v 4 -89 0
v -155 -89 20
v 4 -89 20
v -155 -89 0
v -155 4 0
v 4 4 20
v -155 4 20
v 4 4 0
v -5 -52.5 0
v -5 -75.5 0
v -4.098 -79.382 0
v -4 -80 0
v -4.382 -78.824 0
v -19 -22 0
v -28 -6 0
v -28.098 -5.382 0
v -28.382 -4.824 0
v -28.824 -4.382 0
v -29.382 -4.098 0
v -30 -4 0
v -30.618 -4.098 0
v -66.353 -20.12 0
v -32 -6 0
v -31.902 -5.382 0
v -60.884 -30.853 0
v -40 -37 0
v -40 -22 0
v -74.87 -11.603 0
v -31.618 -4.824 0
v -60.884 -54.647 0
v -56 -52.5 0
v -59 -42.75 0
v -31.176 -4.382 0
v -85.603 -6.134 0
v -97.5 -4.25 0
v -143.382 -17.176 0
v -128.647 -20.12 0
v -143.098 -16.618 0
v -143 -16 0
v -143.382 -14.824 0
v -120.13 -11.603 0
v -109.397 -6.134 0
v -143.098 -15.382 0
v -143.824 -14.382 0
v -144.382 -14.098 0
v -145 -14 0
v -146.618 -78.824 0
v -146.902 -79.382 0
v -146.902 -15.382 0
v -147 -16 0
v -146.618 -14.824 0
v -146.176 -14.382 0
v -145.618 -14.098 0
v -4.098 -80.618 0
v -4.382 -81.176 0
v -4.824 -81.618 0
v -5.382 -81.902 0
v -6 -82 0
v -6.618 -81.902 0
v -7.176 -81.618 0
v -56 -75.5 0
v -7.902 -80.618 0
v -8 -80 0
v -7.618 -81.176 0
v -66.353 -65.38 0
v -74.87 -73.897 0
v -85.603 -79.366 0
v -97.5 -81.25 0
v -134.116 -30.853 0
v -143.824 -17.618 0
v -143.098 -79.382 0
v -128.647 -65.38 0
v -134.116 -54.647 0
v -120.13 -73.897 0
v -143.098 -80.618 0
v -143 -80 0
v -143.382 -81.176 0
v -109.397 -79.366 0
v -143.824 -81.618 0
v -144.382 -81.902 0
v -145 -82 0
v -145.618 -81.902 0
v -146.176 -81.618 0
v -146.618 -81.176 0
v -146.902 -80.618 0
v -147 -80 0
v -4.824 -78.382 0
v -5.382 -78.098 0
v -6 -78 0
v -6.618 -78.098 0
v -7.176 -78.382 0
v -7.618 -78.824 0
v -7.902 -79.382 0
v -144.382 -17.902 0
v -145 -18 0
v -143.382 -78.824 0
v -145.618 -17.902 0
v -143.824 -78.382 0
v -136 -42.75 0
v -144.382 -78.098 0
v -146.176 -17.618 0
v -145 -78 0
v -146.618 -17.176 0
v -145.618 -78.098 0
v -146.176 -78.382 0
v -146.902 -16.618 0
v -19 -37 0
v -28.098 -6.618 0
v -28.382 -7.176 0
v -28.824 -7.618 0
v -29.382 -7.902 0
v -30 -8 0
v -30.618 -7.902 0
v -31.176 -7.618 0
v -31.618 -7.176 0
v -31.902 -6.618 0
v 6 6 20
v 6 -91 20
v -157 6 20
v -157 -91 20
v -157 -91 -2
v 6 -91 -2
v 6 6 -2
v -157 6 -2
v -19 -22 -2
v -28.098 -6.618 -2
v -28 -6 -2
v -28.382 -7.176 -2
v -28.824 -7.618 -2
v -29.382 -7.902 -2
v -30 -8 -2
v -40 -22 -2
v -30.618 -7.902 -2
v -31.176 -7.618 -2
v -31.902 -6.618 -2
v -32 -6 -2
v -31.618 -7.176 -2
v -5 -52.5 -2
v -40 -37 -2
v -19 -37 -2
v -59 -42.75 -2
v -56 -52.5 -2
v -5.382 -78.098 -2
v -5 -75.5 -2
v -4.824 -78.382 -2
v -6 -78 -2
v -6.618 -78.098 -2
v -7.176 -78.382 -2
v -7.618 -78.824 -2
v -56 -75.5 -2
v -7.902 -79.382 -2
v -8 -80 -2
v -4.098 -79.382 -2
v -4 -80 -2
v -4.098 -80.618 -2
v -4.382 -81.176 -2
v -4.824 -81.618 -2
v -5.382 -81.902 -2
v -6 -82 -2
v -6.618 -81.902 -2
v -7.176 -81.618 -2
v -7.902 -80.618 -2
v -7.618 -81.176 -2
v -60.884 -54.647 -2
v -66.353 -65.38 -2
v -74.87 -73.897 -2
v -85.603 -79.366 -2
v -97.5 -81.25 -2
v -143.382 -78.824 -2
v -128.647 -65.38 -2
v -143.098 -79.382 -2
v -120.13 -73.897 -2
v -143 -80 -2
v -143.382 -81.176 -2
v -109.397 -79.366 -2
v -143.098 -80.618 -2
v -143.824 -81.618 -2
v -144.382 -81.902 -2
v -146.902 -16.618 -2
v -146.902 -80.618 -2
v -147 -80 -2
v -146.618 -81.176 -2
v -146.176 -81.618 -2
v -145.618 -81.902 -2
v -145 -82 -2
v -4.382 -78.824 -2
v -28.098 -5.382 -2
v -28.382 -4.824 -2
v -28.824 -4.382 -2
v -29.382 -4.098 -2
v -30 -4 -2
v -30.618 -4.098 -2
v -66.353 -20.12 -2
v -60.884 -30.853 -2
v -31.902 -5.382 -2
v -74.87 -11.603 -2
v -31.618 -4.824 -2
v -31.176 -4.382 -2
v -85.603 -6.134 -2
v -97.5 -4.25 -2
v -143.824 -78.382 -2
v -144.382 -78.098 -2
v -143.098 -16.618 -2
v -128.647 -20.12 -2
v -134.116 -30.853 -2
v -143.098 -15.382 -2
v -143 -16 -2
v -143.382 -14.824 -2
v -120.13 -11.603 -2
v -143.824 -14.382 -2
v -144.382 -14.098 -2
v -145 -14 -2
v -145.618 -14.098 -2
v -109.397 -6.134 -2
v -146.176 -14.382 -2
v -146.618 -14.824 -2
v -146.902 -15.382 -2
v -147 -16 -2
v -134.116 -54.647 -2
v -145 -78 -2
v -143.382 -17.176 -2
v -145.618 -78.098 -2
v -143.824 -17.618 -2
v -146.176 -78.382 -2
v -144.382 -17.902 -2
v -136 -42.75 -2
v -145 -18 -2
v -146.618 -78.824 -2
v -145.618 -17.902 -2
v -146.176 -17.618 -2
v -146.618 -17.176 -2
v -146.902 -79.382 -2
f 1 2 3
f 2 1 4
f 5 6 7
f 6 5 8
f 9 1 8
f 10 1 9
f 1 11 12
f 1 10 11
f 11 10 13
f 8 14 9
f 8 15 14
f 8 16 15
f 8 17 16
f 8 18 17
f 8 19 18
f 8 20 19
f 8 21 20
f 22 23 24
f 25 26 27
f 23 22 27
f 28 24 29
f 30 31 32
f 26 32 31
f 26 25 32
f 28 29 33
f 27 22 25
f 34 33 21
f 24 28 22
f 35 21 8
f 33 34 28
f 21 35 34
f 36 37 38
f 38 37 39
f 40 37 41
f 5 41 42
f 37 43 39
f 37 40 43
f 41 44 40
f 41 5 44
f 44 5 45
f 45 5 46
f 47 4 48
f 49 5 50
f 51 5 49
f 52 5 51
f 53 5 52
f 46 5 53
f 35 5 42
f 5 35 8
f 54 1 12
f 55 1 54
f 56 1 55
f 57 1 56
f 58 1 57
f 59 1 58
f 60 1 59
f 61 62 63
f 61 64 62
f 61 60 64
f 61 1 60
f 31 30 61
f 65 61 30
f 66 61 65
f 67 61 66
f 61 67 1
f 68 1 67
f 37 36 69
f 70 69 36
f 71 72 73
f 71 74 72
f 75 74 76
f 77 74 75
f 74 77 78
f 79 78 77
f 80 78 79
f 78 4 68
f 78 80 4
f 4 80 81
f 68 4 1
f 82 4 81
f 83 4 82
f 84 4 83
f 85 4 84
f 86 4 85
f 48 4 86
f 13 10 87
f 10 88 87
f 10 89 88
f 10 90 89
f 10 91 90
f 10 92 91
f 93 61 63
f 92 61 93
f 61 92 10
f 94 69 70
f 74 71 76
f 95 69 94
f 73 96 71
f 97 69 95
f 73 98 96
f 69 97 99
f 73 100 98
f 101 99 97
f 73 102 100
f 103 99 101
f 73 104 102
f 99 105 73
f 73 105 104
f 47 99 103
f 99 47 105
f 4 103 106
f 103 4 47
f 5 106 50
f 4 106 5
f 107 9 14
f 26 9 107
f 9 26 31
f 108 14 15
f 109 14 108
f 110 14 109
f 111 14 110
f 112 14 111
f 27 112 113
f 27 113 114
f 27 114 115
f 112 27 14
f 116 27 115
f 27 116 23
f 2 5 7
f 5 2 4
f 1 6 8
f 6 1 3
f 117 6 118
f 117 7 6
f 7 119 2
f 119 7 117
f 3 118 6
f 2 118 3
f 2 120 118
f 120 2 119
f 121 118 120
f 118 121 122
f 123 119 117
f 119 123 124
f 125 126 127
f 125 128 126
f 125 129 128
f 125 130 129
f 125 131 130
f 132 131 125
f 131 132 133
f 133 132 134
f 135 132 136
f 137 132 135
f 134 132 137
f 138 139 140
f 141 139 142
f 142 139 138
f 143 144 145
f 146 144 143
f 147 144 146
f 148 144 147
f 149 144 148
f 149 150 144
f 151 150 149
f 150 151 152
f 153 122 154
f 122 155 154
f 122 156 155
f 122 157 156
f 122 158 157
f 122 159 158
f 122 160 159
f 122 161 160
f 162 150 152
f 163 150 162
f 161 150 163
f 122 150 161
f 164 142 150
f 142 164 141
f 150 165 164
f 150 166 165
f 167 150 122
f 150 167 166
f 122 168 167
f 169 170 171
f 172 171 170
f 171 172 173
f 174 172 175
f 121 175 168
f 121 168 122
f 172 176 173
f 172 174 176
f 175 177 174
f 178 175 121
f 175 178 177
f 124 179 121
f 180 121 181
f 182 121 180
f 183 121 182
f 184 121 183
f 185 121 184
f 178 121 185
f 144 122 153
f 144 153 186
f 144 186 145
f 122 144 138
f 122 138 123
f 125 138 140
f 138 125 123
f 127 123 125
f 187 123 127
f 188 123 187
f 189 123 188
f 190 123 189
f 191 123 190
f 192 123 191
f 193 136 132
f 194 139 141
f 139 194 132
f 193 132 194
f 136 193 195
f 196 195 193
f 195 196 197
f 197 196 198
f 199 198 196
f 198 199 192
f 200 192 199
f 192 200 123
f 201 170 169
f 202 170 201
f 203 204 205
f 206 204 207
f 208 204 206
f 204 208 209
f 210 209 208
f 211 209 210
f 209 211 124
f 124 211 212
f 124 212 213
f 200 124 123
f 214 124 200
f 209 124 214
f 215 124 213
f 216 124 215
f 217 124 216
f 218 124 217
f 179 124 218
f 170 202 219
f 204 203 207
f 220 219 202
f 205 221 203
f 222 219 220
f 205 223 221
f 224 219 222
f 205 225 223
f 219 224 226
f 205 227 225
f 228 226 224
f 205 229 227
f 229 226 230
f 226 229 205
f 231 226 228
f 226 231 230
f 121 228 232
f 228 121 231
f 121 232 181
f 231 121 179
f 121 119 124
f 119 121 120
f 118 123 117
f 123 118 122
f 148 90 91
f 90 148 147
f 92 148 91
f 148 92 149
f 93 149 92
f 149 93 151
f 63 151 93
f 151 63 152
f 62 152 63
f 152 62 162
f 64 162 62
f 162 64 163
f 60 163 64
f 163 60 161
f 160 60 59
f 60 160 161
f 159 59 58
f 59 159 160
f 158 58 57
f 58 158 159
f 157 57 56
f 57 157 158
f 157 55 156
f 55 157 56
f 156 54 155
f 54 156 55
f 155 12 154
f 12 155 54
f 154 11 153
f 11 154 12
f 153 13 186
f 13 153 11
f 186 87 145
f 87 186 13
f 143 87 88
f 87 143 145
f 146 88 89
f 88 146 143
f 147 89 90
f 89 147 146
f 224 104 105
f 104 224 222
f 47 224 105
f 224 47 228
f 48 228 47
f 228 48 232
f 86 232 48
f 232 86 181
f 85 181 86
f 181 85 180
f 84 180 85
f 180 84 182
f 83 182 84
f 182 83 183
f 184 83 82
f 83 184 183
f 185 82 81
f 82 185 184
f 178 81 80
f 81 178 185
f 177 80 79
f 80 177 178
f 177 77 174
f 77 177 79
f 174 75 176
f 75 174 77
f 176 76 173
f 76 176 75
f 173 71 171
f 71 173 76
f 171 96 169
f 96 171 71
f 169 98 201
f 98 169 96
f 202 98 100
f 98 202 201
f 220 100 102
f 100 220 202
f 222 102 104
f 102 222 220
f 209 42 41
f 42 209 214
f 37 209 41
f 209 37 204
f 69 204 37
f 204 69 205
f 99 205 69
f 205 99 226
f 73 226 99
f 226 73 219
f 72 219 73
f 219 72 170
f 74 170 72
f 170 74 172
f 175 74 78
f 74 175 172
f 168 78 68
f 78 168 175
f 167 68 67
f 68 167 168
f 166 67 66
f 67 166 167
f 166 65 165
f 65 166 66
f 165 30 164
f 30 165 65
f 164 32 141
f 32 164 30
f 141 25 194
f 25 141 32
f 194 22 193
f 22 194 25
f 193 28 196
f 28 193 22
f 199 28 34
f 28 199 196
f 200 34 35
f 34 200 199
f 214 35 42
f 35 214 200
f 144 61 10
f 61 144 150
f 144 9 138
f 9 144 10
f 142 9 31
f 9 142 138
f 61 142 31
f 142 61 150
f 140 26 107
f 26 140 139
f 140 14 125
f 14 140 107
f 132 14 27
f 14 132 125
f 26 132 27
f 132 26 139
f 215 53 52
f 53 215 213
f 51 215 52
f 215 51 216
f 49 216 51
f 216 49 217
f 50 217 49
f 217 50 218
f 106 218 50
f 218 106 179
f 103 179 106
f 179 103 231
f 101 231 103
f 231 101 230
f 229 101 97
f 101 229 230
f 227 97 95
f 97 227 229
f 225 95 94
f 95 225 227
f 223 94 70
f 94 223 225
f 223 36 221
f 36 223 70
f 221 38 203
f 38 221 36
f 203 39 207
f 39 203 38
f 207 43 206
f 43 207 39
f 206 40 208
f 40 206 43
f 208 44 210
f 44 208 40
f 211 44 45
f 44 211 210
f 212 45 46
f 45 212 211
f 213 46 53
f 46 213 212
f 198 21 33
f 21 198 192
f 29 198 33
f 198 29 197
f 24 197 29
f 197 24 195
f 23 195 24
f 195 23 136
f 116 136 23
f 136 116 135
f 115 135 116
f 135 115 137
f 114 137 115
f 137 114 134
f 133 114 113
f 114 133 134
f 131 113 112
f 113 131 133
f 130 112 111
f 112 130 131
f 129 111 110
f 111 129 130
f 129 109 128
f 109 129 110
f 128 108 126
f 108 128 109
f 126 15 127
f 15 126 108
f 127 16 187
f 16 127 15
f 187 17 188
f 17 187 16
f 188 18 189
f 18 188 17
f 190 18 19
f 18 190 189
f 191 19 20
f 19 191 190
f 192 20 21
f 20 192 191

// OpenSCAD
d = 2;

zPcb = 47;

$fn=20;

module pcbController() {
    xPcb = 70 - 5;
    yPcb = 151;
    zCableOutlet = zPcb - 5;
    
    cube([xPcb, yPcb, zPcb]);
    dCable = 4;
    translate([0,-10,zCableOutlet-dCable/2])cube([xPcb,10,dCable]);
    echo("FIXME: correct positions of the pcb holes");
    for (x=[10,55]) {
        for (y=[10,141]) {
            translate([x,y,-d])cylinder(d=5,h=d);
        }
    }
}


xHousing = 70+141;
yHousing = 151;
zHousing = 85;

overlap=20;
dWood = 4;

module woodenPartsForCNC() {
    square([xHousing,yHousing+2*dWood]);
    translate([0,yHousing+20,0])difference() {
        square([xHousing,zHousing]);
        translate([0,zHousing-15,0])square([70,5]);
    }
    translate([xHousing+20,0,0]) {
        square([xHousing,yHousing+2*dWood]);
        translate([0,yHousing+20,0])square([xHousing,zHousing]);
    }
}


module generalHolder() {
    module woodenMiddlePart() {
        difference() {
            translate([0,-dWood,-dWood])cube([xHousing,yHousing+2*dWood,zHousing+2*dWood]);
            cube([xHousing,yHousing,zHousing]);
        }
    }
    difference() {
        translate([-d,-d-dWood,-d-dWood])cube([overlap+d,yHousing+2*(d+dWood),zHousing+2*(d+dWood)]);
        translate([0,d,d])cube([overlap,yHousing-2*d,zHousing-2*d]);
        woodenMiddlePart();
    }
}

module housingPcbSide() {
    
    module airHoles(nrOfHolesOnY, nrOfHolesOnZ) {
        border=8;
        for (y=[border:(yHousing-2*border)/nrOfHolesOnY:yHousing-border]) {
            for (z=[border:(zHousing-zPcb-2*border)/nrOfHolesOnZ:zHousing-zPcb-border]) {
                translate([-d,y,z])rotate([0,90,0])cylinder(d=5,h=d);
            }
        }
    }
    
    module pcbHolder() {
        translate([0,0,zHousing-zPcb-5])cube([70,yHousing,5]);
    }
    
    pcbHolder();
    difference() {
        generalHolder();
        airHoles(10, 3);
    }
}

module housingPowerSupplySide() {
    module powerSupply() {
        cube([141,yHousing,zHousing]);
    mirror([1,0,0])rotate([90,0,90])linear_extrude(d*1.1) {
            // screw holes
            translate([6,80])circle(d=4);
            translate([yHousing-6,80])circle(d=4);
            translate([yHousing-6,16])circle(d=4);
            translate([30,6])circle(d=4);
            // fan
            translate([(104+91)/2,(36.5+49)/2])circle(d=77);
            // power plug
            translate([5,52.5])square([51,23]);
            // switch
            translate([19,22])square([21,15]);
        }
    }
    difference() {
        generalHolder();
        powerSupply();
    }
}

//rotate([0,-90,90])housingPcbSide();
//woodenPartsForCNC();
rotate([0,-90,90])housingPowerSupplySide();
